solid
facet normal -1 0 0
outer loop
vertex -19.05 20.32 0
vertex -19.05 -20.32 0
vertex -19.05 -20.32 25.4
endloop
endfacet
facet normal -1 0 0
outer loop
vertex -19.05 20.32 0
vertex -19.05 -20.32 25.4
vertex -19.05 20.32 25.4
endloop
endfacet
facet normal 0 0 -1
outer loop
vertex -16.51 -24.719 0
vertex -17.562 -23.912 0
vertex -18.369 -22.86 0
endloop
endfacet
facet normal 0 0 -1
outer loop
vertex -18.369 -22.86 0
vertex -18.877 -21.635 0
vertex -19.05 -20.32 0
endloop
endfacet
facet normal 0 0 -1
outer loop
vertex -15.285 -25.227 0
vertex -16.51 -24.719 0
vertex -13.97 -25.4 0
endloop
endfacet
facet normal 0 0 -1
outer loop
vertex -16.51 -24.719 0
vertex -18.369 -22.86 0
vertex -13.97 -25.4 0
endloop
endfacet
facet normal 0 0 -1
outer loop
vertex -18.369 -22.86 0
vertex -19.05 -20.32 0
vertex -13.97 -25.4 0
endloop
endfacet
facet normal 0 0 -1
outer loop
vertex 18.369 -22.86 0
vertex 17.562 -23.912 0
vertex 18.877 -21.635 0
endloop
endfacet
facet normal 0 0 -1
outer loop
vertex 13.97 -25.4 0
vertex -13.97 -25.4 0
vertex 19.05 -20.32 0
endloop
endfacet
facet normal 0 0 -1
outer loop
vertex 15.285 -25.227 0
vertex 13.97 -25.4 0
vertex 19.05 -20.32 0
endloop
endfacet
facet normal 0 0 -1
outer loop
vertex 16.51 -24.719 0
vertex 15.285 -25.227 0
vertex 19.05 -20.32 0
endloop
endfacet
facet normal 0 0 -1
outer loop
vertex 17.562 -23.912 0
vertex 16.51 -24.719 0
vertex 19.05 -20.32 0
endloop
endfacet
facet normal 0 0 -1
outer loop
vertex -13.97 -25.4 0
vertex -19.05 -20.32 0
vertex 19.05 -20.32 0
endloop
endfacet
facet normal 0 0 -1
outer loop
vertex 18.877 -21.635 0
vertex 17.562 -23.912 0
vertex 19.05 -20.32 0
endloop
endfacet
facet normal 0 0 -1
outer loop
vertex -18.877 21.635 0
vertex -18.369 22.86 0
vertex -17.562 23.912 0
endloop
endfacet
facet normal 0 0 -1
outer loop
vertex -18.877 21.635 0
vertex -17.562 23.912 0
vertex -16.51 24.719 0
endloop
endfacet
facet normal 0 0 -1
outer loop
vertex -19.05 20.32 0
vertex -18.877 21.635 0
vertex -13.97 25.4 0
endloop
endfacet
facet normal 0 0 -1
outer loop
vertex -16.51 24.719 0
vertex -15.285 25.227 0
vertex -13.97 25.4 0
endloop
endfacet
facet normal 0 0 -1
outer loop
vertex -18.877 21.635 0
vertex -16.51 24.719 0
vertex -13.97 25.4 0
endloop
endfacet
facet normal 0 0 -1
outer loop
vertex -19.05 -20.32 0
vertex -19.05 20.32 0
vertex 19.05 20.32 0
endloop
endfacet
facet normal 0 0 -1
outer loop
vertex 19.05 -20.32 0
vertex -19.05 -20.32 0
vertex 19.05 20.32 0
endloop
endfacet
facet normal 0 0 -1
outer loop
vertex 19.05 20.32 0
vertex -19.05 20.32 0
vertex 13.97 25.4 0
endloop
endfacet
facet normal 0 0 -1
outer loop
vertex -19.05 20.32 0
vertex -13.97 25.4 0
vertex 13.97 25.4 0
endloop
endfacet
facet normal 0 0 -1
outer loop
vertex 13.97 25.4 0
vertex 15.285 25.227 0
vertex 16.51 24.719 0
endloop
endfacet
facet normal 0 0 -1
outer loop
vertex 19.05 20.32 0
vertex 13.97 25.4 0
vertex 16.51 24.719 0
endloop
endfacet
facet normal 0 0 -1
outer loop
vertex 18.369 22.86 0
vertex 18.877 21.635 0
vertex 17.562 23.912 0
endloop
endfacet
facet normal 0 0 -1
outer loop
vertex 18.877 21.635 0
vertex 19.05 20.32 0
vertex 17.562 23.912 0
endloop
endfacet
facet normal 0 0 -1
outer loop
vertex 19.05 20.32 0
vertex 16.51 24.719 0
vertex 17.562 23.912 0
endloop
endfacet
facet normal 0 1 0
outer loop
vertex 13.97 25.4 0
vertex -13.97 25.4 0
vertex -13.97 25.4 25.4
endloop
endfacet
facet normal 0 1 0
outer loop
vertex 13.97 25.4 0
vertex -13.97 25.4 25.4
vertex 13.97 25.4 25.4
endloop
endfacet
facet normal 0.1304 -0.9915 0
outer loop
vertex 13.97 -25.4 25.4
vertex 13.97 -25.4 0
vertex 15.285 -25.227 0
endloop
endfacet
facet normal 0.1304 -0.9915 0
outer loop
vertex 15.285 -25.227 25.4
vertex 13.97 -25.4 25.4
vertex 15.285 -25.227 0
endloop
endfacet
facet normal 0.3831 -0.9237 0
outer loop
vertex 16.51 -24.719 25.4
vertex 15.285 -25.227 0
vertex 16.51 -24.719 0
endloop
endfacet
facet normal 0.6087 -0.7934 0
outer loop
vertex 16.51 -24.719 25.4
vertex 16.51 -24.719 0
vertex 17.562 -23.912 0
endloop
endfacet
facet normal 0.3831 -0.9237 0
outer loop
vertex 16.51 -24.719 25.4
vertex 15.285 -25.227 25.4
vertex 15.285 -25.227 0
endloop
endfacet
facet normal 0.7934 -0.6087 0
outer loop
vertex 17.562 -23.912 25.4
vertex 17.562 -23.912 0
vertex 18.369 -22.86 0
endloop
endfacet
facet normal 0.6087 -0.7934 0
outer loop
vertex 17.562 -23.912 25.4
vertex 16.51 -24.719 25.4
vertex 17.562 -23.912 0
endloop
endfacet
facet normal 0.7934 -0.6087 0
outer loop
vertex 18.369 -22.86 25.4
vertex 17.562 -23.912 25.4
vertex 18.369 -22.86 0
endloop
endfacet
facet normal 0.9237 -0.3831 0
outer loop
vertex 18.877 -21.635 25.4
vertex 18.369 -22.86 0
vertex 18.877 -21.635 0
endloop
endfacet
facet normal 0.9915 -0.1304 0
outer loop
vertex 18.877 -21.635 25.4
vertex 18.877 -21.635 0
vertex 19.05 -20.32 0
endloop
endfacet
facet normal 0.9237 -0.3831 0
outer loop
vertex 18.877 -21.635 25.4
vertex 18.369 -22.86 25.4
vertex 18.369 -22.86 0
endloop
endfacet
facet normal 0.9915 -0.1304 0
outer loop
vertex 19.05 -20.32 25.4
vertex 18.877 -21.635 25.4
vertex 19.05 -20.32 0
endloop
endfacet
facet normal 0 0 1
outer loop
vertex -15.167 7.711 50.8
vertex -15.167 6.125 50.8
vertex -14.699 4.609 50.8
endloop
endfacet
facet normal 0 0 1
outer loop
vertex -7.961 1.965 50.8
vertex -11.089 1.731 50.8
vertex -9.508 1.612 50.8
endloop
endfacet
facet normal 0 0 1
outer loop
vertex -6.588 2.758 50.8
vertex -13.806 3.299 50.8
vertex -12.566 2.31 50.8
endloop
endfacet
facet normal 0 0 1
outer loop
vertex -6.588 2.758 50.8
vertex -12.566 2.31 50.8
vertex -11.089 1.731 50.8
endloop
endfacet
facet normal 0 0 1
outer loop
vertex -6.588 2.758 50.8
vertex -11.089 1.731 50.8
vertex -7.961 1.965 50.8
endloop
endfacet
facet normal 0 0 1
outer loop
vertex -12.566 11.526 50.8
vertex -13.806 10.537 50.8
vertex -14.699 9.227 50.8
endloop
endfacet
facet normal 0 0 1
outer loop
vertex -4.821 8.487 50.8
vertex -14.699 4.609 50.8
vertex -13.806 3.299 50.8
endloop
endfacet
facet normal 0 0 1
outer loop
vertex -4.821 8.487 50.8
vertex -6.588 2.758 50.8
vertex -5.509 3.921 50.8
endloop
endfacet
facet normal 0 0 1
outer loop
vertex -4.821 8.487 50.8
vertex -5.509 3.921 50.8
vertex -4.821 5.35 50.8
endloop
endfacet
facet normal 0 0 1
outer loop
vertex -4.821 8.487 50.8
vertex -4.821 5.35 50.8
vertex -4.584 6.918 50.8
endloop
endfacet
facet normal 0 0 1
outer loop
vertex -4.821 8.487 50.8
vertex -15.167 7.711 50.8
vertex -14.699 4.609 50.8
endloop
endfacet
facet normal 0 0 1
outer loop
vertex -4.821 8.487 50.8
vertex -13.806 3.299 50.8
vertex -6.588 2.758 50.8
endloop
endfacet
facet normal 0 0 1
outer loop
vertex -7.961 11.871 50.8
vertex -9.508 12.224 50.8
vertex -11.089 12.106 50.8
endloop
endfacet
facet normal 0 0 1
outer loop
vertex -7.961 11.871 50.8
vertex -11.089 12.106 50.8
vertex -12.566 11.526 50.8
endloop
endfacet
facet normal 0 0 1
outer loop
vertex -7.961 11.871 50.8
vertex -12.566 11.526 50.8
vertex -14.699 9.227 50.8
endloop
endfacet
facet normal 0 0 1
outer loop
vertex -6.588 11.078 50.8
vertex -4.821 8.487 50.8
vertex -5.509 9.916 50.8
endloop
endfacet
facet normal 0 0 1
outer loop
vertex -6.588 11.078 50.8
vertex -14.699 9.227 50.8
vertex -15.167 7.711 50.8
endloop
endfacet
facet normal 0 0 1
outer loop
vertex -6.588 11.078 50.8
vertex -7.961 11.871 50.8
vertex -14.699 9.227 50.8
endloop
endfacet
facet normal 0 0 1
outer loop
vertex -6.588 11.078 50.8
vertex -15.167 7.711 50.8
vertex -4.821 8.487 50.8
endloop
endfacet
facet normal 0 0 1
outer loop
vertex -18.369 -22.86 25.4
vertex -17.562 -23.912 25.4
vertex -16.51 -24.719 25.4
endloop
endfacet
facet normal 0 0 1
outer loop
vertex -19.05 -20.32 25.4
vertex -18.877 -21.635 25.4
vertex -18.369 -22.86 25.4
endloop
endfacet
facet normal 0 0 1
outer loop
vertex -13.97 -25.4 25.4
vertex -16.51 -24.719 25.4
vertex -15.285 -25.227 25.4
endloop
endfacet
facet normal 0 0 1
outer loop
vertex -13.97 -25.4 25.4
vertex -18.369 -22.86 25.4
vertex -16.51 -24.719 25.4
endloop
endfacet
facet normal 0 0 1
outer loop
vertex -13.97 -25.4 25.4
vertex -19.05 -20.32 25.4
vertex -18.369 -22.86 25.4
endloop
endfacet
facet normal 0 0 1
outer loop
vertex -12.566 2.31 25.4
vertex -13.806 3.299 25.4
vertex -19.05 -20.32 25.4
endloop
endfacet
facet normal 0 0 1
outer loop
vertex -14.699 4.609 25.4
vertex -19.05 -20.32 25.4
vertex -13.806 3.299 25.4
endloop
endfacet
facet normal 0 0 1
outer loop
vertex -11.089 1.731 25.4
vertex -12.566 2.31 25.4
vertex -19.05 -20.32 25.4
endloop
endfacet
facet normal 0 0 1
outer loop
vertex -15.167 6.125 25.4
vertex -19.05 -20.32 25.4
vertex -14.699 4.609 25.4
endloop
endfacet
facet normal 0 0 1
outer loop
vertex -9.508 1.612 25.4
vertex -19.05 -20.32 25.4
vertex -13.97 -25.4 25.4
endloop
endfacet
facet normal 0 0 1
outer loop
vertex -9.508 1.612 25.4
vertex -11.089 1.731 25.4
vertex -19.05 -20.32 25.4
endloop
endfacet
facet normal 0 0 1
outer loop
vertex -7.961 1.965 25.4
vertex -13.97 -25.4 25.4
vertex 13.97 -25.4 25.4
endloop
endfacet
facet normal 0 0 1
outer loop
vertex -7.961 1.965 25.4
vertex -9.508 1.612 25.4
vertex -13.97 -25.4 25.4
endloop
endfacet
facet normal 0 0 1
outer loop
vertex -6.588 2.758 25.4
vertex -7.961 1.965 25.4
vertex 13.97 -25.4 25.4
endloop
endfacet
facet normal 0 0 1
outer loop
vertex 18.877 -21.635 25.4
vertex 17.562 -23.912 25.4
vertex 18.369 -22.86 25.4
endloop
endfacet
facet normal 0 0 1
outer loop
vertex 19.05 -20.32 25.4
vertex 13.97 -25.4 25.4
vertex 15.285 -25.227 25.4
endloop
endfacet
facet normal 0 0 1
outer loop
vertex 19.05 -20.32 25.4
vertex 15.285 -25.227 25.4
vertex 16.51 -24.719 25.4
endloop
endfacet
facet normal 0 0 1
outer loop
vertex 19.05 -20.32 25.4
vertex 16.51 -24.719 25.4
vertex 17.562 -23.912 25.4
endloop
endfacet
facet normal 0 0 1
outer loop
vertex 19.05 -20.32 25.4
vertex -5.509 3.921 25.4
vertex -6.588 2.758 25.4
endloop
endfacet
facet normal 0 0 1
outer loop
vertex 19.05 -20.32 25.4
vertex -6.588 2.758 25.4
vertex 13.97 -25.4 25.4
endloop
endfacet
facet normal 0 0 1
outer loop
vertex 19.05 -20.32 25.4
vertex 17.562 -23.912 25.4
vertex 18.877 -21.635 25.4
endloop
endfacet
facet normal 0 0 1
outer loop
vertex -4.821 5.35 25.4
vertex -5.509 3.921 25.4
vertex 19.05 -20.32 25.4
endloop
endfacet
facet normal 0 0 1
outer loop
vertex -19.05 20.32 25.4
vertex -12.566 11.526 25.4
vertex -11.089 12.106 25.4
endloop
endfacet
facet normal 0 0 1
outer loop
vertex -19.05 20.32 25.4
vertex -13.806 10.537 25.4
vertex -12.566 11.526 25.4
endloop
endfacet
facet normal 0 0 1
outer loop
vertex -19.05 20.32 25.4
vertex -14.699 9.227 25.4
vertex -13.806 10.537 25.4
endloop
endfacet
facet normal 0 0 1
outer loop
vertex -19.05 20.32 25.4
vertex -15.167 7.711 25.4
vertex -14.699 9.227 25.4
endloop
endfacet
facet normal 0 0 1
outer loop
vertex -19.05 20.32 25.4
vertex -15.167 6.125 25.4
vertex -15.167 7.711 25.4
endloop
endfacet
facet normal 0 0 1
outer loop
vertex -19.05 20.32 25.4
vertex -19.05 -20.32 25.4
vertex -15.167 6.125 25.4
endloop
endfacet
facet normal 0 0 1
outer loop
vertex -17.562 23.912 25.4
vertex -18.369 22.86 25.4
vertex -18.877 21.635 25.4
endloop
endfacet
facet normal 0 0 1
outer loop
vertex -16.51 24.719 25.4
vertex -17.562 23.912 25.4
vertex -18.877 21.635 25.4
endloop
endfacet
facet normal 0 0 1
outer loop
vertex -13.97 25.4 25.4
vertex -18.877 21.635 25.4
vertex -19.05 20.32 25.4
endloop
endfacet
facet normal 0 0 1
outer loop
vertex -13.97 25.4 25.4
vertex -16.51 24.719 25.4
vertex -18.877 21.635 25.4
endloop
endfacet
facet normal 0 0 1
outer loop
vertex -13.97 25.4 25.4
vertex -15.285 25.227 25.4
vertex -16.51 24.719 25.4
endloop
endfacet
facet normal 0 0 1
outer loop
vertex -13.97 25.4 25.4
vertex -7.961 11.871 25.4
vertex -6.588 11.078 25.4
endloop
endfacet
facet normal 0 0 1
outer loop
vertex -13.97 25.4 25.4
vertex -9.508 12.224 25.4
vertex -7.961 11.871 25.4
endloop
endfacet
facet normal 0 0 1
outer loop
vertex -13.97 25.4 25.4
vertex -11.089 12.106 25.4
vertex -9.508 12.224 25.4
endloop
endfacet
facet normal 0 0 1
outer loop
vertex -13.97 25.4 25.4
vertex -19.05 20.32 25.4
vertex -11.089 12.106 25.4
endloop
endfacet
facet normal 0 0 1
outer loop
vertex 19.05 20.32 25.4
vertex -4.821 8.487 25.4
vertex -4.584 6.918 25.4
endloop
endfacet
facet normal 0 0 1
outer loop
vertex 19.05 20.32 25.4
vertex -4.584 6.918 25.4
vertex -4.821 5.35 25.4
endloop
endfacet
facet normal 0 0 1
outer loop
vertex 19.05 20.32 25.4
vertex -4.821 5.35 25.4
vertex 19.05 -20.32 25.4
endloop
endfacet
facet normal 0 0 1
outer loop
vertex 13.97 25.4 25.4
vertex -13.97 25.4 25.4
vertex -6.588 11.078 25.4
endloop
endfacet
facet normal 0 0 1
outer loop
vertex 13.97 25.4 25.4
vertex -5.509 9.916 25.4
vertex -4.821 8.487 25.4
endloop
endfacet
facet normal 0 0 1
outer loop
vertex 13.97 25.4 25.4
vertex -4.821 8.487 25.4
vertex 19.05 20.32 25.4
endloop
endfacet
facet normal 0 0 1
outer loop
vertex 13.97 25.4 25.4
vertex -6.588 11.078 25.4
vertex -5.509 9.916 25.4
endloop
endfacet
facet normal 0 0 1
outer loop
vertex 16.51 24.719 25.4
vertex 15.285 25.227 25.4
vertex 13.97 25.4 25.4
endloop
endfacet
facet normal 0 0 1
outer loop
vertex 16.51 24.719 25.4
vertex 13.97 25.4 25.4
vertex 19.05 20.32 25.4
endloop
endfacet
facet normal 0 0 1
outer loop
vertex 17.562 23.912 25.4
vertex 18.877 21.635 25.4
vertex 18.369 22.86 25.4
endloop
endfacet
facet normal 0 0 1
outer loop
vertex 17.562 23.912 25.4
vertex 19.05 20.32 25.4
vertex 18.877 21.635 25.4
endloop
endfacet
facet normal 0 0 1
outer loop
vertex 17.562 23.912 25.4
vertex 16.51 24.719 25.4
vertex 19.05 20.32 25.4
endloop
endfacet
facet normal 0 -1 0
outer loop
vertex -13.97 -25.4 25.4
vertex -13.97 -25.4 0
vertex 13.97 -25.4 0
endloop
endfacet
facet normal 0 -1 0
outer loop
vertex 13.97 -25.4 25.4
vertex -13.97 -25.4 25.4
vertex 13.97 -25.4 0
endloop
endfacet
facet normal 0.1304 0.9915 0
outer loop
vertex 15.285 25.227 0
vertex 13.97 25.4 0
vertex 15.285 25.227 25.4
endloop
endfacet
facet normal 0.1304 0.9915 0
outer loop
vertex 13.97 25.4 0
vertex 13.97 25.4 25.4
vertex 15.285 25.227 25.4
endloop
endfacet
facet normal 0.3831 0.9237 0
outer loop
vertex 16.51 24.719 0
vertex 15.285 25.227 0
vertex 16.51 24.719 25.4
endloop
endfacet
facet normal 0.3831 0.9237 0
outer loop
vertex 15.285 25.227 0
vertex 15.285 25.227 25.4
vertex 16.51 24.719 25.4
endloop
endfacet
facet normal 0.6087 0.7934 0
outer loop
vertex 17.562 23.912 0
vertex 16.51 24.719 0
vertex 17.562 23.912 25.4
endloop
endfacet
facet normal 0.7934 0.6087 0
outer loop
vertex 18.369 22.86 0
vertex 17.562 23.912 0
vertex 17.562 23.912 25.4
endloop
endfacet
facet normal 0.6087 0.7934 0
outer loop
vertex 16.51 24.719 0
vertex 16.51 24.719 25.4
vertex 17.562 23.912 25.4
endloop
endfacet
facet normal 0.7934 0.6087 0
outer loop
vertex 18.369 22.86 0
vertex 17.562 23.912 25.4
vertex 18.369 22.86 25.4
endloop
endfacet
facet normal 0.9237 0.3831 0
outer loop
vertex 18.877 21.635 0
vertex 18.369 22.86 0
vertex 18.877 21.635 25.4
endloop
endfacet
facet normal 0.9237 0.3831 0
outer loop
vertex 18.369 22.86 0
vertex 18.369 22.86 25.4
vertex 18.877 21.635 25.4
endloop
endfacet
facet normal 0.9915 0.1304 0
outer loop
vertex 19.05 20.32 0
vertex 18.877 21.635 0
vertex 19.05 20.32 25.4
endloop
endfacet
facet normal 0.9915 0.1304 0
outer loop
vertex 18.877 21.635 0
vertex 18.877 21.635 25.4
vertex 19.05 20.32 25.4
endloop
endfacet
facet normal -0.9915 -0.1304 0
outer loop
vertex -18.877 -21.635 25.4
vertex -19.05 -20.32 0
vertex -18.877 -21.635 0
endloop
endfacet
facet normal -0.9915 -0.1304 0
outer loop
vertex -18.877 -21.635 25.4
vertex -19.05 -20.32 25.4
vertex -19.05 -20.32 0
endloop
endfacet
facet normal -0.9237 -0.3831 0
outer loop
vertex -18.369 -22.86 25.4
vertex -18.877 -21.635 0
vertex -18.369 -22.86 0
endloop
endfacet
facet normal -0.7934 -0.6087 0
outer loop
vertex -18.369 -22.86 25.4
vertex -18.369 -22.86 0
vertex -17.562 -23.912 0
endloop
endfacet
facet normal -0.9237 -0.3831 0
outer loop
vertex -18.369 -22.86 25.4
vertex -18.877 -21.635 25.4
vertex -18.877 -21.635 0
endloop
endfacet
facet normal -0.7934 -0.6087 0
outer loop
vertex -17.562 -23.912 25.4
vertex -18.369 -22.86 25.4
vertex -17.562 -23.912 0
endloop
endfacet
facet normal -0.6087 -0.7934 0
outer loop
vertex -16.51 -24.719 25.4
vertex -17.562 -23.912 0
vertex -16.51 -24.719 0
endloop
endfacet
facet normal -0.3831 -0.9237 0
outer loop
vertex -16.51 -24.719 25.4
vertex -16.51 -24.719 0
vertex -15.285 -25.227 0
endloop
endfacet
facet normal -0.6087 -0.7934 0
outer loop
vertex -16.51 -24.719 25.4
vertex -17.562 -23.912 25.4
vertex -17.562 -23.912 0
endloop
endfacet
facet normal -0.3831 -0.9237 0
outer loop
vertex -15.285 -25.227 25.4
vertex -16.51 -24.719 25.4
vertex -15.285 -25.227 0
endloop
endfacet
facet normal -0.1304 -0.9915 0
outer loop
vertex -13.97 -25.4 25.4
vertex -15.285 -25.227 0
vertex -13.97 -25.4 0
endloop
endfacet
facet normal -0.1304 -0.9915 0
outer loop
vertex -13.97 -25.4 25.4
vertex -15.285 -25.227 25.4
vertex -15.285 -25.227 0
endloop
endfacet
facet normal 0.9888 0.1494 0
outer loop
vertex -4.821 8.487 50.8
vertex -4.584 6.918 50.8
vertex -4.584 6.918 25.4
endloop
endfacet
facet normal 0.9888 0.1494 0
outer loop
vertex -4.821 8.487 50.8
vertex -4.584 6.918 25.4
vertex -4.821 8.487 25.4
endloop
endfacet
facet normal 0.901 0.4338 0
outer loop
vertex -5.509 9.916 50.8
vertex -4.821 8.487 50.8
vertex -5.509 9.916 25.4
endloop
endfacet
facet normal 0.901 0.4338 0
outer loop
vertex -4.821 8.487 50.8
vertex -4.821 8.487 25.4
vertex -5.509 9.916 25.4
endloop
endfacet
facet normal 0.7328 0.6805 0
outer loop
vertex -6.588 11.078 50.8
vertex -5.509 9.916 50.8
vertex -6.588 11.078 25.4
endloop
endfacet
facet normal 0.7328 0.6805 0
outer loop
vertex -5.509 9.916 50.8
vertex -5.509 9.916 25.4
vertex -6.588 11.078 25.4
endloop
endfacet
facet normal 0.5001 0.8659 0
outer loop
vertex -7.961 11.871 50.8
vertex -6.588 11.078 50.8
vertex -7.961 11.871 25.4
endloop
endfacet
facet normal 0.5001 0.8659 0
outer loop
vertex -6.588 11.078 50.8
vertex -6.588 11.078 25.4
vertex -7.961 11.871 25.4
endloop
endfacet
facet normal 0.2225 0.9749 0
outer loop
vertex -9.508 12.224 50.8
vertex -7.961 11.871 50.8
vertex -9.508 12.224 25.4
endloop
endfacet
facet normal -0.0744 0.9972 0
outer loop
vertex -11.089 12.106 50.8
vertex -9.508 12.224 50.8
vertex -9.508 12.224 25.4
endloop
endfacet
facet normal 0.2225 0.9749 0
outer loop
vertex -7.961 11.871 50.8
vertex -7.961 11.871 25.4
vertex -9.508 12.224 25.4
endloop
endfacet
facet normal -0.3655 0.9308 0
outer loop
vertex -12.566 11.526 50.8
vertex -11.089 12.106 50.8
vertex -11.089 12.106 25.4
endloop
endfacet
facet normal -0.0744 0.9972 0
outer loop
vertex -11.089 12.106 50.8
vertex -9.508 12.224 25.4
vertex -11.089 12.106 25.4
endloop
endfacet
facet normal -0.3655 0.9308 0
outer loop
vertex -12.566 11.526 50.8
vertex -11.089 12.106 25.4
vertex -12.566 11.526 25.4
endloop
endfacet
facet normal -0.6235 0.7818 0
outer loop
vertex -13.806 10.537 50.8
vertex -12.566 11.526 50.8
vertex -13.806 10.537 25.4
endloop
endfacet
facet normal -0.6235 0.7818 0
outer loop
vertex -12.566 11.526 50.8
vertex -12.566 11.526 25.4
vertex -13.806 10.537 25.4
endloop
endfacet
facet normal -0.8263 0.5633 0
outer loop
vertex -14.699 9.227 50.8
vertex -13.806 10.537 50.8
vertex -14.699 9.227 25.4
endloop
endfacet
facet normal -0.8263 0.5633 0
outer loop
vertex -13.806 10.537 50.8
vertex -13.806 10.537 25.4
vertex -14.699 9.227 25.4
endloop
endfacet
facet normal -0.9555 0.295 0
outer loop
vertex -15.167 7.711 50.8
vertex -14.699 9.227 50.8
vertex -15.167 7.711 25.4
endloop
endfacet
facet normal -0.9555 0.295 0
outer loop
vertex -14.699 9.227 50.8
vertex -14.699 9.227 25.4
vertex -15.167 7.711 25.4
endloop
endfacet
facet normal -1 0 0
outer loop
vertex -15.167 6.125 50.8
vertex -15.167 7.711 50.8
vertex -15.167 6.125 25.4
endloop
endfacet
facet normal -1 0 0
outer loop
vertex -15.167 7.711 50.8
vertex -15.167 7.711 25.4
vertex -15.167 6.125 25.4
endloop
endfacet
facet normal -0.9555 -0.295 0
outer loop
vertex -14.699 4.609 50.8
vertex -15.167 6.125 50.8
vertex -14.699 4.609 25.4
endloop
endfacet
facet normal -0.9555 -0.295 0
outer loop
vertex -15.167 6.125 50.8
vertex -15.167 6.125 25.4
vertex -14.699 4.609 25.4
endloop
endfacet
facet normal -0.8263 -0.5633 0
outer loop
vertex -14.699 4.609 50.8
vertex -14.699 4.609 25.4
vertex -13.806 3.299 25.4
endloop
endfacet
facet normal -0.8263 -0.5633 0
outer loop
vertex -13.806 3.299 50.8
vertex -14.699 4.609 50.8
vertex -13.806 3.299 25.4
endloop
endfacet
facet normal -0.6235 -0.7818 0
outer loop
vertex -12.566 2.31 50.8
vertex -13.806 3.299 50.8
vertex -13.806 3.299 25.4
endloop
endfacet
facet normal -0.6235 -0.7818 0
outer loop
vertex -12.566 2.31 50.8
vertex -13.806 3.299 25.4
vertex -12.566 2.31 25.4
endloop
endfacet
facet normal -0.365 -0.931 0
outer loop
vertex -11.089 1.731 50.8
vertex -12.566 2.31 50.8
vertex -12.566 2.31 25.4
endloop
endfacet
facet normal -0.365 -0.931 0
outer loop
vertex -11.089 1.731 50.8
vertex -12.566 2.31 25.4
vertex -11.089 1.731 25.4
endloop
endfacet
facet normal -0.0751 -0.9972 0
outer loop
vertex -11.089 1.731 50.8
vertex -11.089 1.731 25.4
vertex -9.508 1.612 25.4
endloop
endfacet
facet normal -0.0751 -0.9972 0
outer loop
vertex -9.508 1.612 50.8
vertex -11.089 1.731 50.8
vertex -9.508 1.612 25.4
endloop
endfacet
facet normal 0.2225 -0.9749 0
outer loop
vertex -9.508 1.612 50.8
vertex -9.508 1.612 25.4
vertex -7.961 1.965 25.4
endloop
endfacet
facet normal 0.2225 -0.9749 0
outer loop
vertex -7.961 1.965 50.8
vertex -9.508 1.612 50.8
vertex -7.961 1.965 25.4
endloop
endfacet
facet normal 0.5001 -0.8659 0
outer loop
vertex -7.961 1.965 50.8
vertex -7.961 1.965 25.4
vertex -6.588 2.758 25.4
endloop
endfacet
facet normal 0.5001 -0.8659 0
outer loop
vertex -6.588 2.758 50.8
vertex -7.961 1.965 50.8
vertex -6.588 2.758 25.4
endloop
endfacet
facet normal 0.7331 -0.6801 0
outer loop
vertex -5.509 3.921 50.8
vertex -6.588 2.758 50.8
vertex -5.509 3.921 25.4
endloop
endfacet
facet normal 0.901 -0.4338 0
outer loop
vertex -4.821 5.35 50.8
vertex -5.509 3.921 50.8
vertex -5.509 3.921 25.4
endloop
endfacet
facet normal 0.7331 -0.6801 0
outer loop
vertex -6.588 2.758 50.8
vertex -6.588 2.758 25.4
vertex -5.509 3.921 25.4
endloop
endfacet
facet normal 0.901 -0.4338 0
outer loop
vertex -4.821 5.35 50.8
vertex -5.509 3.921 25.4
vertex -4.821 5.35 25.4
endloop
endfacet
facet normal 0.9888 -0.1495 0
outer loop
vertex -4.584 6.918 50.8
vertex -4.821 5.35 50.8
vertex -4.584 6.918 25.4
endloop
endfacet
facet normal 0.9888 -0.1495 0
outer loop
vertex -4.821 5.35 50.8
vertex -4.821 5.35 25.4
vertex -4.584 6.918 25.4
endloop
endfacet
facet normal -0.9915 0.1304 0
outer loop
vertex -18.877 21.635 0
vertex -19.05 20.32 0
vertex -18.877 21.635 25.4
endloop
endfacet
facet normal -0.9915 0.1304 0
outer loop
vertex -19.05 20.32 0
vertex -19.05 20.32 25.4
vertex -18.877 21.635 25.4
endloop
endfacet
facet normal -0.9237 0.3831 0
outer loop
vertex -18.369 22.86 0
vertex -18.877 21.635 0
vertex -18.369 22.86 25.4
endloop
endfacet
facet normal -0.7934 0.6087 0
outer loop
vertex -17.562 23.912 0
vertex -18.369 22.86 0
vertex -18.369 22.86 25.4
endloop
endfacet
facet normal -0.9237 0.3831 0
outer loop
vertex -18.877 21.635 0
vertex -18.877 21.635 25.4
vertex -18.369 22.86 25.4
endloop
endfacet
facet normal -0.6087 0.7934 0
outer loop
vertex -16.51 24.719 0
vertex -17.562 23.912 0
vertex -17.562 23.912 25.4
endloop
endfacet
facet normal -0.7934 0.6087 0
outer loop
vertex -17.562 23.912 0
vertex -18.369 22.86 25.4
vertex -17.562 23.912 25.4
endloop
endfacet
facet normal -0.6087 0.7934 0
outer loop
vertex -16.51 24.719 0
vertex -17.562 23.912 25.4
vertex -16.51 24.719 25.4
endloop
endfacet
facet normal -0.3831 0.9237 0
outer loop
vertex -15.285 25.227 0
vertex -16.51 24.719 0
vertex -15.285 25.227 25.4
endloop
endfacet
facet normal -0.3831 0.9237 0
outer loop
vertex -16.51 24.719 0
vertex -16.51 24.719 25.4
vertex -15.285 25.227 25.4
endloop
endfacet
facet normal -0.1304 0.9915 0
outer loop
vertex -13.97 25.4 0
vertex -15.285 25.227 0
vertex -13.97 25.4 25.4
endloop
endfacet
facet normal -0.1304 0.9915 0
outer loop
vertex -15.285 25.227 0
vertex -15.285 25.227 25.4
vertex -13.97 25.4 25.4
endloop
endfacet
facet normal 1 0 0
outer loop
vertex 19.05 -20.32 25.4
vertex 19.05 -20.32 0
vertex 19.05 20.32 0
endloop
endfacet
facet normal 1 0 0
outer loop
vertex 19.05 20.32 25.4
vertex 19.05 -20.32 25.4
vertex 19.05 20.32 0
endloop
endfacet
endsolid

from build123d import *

# Parameters (mm, degrees)
F0_W     = 38.1
F0_H     = 50.8
F1_DEPTH = 25.4
F2_R     = 5.321042
F3_DEPTH = 25.4
F4_R     = 5.08


with BuildPart() as f1:
    # F0 (on Top) → F1 (new body)
    with BuildSketch(Plane.XY):
        Rectangle(F0_W, F0_H)
    extrude(amount=F1_DEPTH)

    # F2 (on face) → F3 (join)
    with BuildSketch(Plane.XY.offset(25.4)):
        with Locations((-9.905285, 6.918165)):
            Circle(F2_R)
    extrude(amount=F3_DEPTH)

    # F4
    f4_edges = [f1.edges().sort_by_distance(p)[0] for p in [
        (-19.05, -25.4, 12.7),
        (19.05, -25.4, 12.7),
        (-19.05, 25.4, 12.7),
        (19.05, 25.4, 12.7),
    ]]
    fillet(f4_edges, radius=F4_R)


solid = f1.part
